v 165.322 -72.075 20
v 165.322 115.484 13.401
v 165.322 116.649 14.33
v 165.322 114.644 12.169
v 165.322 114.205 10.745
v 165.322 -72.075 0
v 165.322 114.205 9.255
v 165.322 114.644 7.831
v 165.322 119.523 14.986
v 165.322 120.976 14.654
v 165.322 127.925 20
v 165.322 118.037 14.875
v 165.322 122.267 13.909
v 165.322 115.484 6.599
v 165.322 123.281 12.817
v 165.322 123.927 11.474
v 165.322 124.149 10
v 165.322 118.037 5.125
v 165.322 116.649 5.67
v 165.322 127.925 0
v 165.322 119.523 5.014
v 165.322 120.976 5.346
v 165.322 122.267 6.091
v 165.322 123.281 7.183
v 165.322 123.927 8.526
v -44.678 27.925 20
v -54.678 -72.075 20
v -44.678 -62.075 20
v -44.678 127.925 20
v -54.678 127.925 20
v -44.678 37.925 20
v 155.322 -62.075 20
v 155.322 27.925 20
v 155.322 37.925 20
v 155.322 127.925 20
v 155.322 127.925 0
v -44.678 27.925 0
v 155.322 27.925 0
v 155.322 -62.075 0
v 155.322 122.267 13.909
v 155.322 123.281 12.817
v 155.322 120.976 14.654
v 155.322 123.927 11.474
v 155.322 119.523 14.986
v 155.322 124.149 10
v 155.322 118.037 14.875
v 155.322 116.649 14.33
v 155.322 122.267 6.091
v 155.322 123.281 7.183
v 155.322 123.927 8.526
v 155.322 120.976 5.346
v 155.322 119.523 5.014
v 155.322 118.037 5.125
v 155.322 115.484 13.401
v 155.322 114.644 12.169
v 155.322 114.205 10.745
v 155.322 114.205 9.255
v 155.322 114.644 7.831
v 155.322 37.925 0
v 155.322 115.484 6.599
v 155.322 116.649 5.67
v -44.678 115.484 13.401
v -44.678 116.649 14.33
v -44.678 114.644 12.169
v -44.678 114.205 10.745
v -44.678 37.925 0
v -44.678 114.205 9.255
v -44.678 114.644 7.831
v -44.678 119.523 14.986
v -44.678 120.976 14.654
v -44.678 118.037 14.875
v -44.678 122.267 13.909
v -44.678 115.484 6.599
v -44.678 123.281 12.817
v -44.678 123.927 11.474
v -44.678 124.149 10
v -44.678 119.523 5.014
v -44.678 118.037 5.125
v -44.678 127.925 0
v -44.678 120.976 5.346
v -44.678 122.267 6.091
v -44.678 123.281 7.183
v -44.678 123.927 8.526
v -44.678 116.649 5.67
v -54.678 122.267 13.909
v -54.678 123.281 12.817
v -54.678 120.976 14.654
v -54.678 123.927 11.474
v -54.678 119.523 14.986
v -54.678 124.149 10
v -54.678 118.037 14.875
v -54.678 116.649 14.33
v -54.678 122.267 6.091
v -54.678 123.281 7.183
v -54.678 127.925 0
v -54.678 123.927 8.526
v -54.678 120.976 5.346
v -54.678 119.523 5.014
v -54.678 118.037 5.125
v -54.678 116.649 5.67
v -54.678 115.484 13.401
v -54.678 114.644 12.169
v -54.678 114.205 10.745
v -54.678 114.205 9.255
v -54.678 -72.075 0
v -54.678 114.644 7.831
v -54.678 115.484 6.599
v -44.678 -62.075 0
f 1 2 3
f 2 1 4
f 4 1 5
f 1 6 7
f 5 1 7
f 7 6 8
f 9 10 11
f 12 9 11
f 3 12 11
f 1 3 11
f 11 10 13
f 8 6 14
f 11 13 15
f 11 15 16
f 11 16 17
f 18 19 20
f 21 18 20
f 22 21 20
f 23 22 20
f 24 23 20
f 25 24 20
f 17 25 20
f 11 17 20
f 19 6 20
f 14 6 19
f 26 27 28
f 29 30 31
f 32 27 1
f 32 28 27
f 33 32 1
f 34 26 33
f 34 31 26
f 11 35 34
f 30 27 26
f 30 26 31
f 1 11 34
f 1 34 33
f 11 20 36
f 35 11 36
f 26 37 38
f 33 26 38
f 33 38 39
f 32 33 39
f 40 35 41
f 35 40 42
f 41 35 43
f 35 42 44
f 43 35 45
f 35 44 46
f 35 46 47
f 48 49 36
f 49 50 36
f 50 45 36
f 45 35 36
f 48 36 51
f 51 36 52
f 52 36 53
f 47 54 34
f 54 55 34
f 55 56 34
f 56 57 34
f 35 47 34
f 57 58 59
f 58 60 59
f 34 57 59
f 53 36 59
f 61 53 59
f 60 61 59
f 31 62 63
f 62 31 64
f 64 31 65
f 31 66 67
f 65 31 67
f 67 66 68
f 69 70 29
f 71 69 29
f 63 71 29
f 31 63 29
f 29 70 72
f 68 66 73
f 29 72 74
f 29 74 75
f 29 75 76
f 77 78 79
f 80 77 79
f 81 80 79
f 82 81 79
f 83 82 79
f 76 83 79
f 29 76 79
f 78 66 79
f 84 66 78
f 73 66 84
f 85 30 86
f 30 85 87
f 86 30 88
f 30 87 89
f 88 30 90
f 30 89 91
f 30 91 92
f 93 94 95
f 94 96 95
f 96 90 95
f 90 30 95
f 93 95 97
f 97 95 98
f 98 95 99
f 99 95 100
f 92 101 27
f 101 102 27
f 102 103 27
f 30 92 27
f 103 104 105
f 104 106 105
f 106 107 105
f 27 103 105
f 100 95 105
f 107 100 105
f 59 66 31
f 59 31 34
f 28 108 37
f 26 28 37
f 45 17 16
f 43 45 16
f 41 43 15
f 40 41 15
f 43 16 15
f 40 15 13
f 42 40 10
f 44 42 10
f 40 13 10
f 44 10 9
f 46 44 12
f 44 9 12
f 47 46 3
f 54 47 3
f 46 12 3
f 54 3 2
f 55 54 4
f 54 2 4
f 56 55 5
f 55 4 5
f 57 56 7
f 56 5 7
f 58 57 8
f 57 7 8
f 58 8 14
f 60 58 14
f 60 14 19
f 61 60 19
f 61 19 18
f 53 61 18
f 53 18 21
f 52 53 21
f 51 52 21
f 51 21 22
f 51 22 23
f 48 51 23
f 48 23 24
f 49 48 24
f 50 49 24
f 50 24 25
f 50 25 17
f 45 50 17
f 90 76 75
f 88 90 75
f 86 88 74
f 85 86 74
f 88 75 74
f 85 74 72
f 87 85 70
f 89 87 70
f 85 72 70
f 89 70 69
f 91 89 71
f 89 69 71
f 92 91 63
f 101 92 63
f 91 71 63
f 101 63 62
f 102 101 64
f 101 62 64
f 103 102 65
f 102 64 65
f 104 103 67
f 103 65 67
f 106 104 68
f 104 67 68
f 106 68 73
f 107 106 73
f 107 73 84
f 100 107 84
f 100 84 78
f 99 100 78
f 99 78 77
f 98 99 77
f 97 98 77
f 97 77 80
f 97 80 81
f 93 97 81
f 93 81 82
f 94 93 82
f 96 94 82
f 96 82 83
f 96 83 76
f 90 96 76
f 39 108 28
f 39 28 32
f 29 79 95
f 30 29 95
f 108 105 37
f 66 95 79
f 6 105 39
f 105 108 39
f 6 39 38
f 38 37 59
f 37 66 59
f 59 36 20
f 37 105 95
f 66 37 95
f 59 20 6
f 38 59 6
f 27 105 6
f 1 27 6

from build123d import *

# Parameters (mm, degrees)
F0_W     = 200
F0_H     = 10
F1_DEPTH = 20
F2_R     = 5
F3_DEPTH = 563


with BuildPart() as f1:
    # F0 (on Top) → F1 (new body)
    with BuildSketch(Plane.XY):
        Polygon((-44.678043, 37.924974), (-44.678043, 127.924974), (-54.678043, 127.924974), (-54.678043, -72.075026), (-44.678043, -72.075026), (-44.678043, -62.075026), (-44.678043, 27.924974), align=None)
        with Locations((55.321957, 32.924974)):
            Rectangle(F0_W, F0_H)
        Polygon((155.321957, 127.924974), (155.321957, 37.924974), (155.321957, 27.924974), (155.321957, -62.075026), (155.321957, -72.075026), (165.321957, -72.075026), (165.321957, 127.924974), align=None)
        with Locations((55.321957, -67.075026)):
            Rectangle(F0_W, F0_H)
    extrude(amount=F1_DEPTH)

    # F2 (on face) → F3 (cut)
    with BuildSketch(Plane.YZ.offset(165.321957)):
        with Locations((119.149327, 10)):
            Circle(F2_R)
    extrude(amount=-F3_DEPTH, mode=Mode.SUBTRACT)


solid = f1.part
